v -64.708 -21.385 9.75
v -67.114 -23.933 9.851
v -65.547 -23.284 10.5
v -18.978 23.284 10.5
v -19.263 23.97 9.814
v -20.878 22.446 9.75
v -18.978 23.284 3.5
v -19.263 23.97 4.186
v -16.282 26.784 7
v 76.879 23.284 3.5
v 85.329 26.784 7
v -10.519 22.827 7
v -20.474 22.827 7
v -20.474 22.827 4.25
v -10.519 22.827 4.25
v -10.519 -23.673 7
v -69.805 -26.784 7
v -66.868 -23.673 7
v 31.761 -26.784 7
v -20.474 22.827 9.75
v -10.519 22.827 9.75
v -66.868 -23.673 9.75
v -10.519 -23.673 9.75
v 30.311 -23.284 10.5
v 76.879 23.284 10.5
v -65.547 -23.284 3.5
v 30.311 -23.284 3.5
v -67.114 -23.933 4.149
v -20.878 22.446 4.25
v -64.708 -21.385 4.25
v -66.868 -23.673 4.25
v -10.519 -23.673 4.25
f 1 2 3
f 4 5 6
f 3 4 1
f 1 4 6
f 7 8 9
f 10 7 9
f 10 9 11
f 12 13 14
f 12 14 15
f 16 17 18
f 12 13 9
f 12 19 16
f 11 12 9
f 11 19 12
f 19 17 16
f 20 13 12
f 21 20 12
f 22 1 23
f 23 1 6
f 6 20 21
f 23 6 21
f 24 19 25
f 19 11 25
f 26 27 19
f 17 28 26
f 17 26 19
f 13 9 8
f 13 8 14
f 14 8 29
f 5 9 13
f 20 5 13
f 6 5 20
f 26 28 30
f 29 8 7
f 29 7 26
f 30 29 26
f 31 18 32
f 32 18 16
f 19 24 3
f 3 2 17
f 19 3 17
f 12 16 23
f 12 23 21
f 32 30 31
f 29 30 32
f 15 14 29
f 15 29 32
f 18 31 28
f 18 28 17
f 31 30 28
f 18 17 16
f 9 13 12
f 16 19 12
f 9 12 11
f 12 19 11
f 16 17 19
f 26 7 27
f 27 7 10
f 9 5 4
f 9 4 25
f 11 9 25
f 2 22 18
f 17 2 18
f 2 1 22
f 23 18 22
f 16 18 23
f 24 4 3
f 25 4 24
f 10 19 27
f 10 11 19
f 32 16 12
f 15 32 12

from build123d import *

# Parameters (mm, degrees)
F2_DEPTH    = 3.5
F3_T1_DEPTH = 105.7168298797
F3_T3_DEPTH = 135.7168298797
F3_T5_DEPTH = 105.7168298797
F3_T7_DEPTH = 135.7168298797
F5_W        = 95.1956471843
F5_H        = 46.5
F6_DEPTH    = 2.75
F7_DEPTH    = 25
F9_DEPTH    = 38.4
F10_DEPTH   = 38.4


# Not quite as in the source:
# - a fillet or chamfer that OpenCascade refuses, or shapes differently, is made with other operations: its cross-section is extruded or revolved along the edge and cut away or added


with BuildPart() as f2:
    # F1 (on offset) → F2 (new body)
    with BuildSketch(Plane.XY.offset(3.5)):
        Polygon((11.806184426, -28.2842712475), (32.3819887268, -28.2842712475), (60.6662599742, 0), (88.9505312217, 28.2842712475), (-21.0494687783, 28.2842712475), (-77.6180112732, -28.2842712475), align=None)
    extrude(amount=F2_DEPTH)

    # F3: chamfer of 5 on 4 edges, made by hand

    # F3_s2 → F3_t1 (cut)
    with BuildSketch(Plane(origin=(12.7096736338, 12.7096736338, 0), x_dir=(0, 0, 1), z_dir=(-0.7071067812, -0.7071067812, 0))):
        Polygon((8.5, 34.8842221135), (3.5, 29.8842221135), (3.5, 34.8842221135), align=None)
    extrude(amount=F3_T1_DEPTH, mode=Mode.SUBTRACT)

    # F3_s4 → F3_t3 (cut)
    with BuildSketch(Plane.YZ.offset(-90.476426213)):
        Polygon((-23.2842712475, 3.5), (-28.2842712475, 8.5), (-28.2842712475, 3.5), align=None)
    extrude(amount=F3_T3_DEPTH, mode=Mode.SUBTRACT)

    # F3_s6 → F3_t5 (cut)
    with BuildSketch(Plane(origin=(-7.0434136596, -7.0434136596, 0), x_dir=(0, 0, 1), z_dir=(0.7071067812, 0.7071067812, 0))):
        Polygon((8.5, 42.897523817), (3.5, 37.897523817), (3.5, 42.897523817), align=None)
    extrude(amount=F3_T5_DEPTH, mode=Mode.SUBTRACT)

    # F3_s8 → F3_t7 (cut)
    with BuildSketch(Plane.YZ.offset(-33.9078837181)):
        Polygon((23.2842712475, 3.5), (28.2842712475, 8.5), (28.2842712475, 3.5), align=None)
    extrude(amount=F3_T7_DEPTH, mode=Mode.SUBTRACT)

    # F5 (on face) → F6 (cut)
    with BuildSketch(Plane.XY.offset(7)):
        with Locations((-19.7168718299, -0.4228247255)):
            Rectangle(F5_W, F5_H)
    extrude(amount=-F6_DEPTH, mode=Mode.SUBTRACT)

    # F4 (on face) → F7 (cut)
    with BuildSketch(Plane(origin=(0, 0, 3.5), x_dir=(1, 0, 0), z_dir=(0, 0, -1))):
        Polygon((-24.8950392013, -18.653216398), (-27.3769648583, -30.3716328172), (-13.6225454044, -33.1324383258), (-13.6225454044, -29.2945806164), align=None)
        Polygon((-72.634305031, 14.8857073556), (-60.9158886119, 17.3676330126), (-71.5572528303, 28.6401268095), (-75.3951105397, 28.6401268095), align=None)
    extrude(amount=-F7_DEPTH, mode=Mode.SUBTRACT)


with BuildPart() as f8_1:
    # F8: instance of F2
    add(f2.part.mirror(Plane.XY.offset(7)))

    # F10 (add): a face of the model
    f10_faces = [f8_1.faces().sort_by_distance(p)[0] for p in [
        (27.8809517622, -0.4228247255, 8.375),
    ]]
    extrude(f10_faces, amount=F10_DEPTH)


with BuildPart() as f2_1:
    add(f2.part)

    # F9 (add): a face of the model
    f9_faces = [f2_1.faces().sort_by_distance(p)[0] for p in [
        (27.8809517622, -0.4228247255, 5.625),
    ]]
    extrude(f9_faces, amount=F9_DEPTH)


solid = Compound([f8_1.part, f2_1.part])
